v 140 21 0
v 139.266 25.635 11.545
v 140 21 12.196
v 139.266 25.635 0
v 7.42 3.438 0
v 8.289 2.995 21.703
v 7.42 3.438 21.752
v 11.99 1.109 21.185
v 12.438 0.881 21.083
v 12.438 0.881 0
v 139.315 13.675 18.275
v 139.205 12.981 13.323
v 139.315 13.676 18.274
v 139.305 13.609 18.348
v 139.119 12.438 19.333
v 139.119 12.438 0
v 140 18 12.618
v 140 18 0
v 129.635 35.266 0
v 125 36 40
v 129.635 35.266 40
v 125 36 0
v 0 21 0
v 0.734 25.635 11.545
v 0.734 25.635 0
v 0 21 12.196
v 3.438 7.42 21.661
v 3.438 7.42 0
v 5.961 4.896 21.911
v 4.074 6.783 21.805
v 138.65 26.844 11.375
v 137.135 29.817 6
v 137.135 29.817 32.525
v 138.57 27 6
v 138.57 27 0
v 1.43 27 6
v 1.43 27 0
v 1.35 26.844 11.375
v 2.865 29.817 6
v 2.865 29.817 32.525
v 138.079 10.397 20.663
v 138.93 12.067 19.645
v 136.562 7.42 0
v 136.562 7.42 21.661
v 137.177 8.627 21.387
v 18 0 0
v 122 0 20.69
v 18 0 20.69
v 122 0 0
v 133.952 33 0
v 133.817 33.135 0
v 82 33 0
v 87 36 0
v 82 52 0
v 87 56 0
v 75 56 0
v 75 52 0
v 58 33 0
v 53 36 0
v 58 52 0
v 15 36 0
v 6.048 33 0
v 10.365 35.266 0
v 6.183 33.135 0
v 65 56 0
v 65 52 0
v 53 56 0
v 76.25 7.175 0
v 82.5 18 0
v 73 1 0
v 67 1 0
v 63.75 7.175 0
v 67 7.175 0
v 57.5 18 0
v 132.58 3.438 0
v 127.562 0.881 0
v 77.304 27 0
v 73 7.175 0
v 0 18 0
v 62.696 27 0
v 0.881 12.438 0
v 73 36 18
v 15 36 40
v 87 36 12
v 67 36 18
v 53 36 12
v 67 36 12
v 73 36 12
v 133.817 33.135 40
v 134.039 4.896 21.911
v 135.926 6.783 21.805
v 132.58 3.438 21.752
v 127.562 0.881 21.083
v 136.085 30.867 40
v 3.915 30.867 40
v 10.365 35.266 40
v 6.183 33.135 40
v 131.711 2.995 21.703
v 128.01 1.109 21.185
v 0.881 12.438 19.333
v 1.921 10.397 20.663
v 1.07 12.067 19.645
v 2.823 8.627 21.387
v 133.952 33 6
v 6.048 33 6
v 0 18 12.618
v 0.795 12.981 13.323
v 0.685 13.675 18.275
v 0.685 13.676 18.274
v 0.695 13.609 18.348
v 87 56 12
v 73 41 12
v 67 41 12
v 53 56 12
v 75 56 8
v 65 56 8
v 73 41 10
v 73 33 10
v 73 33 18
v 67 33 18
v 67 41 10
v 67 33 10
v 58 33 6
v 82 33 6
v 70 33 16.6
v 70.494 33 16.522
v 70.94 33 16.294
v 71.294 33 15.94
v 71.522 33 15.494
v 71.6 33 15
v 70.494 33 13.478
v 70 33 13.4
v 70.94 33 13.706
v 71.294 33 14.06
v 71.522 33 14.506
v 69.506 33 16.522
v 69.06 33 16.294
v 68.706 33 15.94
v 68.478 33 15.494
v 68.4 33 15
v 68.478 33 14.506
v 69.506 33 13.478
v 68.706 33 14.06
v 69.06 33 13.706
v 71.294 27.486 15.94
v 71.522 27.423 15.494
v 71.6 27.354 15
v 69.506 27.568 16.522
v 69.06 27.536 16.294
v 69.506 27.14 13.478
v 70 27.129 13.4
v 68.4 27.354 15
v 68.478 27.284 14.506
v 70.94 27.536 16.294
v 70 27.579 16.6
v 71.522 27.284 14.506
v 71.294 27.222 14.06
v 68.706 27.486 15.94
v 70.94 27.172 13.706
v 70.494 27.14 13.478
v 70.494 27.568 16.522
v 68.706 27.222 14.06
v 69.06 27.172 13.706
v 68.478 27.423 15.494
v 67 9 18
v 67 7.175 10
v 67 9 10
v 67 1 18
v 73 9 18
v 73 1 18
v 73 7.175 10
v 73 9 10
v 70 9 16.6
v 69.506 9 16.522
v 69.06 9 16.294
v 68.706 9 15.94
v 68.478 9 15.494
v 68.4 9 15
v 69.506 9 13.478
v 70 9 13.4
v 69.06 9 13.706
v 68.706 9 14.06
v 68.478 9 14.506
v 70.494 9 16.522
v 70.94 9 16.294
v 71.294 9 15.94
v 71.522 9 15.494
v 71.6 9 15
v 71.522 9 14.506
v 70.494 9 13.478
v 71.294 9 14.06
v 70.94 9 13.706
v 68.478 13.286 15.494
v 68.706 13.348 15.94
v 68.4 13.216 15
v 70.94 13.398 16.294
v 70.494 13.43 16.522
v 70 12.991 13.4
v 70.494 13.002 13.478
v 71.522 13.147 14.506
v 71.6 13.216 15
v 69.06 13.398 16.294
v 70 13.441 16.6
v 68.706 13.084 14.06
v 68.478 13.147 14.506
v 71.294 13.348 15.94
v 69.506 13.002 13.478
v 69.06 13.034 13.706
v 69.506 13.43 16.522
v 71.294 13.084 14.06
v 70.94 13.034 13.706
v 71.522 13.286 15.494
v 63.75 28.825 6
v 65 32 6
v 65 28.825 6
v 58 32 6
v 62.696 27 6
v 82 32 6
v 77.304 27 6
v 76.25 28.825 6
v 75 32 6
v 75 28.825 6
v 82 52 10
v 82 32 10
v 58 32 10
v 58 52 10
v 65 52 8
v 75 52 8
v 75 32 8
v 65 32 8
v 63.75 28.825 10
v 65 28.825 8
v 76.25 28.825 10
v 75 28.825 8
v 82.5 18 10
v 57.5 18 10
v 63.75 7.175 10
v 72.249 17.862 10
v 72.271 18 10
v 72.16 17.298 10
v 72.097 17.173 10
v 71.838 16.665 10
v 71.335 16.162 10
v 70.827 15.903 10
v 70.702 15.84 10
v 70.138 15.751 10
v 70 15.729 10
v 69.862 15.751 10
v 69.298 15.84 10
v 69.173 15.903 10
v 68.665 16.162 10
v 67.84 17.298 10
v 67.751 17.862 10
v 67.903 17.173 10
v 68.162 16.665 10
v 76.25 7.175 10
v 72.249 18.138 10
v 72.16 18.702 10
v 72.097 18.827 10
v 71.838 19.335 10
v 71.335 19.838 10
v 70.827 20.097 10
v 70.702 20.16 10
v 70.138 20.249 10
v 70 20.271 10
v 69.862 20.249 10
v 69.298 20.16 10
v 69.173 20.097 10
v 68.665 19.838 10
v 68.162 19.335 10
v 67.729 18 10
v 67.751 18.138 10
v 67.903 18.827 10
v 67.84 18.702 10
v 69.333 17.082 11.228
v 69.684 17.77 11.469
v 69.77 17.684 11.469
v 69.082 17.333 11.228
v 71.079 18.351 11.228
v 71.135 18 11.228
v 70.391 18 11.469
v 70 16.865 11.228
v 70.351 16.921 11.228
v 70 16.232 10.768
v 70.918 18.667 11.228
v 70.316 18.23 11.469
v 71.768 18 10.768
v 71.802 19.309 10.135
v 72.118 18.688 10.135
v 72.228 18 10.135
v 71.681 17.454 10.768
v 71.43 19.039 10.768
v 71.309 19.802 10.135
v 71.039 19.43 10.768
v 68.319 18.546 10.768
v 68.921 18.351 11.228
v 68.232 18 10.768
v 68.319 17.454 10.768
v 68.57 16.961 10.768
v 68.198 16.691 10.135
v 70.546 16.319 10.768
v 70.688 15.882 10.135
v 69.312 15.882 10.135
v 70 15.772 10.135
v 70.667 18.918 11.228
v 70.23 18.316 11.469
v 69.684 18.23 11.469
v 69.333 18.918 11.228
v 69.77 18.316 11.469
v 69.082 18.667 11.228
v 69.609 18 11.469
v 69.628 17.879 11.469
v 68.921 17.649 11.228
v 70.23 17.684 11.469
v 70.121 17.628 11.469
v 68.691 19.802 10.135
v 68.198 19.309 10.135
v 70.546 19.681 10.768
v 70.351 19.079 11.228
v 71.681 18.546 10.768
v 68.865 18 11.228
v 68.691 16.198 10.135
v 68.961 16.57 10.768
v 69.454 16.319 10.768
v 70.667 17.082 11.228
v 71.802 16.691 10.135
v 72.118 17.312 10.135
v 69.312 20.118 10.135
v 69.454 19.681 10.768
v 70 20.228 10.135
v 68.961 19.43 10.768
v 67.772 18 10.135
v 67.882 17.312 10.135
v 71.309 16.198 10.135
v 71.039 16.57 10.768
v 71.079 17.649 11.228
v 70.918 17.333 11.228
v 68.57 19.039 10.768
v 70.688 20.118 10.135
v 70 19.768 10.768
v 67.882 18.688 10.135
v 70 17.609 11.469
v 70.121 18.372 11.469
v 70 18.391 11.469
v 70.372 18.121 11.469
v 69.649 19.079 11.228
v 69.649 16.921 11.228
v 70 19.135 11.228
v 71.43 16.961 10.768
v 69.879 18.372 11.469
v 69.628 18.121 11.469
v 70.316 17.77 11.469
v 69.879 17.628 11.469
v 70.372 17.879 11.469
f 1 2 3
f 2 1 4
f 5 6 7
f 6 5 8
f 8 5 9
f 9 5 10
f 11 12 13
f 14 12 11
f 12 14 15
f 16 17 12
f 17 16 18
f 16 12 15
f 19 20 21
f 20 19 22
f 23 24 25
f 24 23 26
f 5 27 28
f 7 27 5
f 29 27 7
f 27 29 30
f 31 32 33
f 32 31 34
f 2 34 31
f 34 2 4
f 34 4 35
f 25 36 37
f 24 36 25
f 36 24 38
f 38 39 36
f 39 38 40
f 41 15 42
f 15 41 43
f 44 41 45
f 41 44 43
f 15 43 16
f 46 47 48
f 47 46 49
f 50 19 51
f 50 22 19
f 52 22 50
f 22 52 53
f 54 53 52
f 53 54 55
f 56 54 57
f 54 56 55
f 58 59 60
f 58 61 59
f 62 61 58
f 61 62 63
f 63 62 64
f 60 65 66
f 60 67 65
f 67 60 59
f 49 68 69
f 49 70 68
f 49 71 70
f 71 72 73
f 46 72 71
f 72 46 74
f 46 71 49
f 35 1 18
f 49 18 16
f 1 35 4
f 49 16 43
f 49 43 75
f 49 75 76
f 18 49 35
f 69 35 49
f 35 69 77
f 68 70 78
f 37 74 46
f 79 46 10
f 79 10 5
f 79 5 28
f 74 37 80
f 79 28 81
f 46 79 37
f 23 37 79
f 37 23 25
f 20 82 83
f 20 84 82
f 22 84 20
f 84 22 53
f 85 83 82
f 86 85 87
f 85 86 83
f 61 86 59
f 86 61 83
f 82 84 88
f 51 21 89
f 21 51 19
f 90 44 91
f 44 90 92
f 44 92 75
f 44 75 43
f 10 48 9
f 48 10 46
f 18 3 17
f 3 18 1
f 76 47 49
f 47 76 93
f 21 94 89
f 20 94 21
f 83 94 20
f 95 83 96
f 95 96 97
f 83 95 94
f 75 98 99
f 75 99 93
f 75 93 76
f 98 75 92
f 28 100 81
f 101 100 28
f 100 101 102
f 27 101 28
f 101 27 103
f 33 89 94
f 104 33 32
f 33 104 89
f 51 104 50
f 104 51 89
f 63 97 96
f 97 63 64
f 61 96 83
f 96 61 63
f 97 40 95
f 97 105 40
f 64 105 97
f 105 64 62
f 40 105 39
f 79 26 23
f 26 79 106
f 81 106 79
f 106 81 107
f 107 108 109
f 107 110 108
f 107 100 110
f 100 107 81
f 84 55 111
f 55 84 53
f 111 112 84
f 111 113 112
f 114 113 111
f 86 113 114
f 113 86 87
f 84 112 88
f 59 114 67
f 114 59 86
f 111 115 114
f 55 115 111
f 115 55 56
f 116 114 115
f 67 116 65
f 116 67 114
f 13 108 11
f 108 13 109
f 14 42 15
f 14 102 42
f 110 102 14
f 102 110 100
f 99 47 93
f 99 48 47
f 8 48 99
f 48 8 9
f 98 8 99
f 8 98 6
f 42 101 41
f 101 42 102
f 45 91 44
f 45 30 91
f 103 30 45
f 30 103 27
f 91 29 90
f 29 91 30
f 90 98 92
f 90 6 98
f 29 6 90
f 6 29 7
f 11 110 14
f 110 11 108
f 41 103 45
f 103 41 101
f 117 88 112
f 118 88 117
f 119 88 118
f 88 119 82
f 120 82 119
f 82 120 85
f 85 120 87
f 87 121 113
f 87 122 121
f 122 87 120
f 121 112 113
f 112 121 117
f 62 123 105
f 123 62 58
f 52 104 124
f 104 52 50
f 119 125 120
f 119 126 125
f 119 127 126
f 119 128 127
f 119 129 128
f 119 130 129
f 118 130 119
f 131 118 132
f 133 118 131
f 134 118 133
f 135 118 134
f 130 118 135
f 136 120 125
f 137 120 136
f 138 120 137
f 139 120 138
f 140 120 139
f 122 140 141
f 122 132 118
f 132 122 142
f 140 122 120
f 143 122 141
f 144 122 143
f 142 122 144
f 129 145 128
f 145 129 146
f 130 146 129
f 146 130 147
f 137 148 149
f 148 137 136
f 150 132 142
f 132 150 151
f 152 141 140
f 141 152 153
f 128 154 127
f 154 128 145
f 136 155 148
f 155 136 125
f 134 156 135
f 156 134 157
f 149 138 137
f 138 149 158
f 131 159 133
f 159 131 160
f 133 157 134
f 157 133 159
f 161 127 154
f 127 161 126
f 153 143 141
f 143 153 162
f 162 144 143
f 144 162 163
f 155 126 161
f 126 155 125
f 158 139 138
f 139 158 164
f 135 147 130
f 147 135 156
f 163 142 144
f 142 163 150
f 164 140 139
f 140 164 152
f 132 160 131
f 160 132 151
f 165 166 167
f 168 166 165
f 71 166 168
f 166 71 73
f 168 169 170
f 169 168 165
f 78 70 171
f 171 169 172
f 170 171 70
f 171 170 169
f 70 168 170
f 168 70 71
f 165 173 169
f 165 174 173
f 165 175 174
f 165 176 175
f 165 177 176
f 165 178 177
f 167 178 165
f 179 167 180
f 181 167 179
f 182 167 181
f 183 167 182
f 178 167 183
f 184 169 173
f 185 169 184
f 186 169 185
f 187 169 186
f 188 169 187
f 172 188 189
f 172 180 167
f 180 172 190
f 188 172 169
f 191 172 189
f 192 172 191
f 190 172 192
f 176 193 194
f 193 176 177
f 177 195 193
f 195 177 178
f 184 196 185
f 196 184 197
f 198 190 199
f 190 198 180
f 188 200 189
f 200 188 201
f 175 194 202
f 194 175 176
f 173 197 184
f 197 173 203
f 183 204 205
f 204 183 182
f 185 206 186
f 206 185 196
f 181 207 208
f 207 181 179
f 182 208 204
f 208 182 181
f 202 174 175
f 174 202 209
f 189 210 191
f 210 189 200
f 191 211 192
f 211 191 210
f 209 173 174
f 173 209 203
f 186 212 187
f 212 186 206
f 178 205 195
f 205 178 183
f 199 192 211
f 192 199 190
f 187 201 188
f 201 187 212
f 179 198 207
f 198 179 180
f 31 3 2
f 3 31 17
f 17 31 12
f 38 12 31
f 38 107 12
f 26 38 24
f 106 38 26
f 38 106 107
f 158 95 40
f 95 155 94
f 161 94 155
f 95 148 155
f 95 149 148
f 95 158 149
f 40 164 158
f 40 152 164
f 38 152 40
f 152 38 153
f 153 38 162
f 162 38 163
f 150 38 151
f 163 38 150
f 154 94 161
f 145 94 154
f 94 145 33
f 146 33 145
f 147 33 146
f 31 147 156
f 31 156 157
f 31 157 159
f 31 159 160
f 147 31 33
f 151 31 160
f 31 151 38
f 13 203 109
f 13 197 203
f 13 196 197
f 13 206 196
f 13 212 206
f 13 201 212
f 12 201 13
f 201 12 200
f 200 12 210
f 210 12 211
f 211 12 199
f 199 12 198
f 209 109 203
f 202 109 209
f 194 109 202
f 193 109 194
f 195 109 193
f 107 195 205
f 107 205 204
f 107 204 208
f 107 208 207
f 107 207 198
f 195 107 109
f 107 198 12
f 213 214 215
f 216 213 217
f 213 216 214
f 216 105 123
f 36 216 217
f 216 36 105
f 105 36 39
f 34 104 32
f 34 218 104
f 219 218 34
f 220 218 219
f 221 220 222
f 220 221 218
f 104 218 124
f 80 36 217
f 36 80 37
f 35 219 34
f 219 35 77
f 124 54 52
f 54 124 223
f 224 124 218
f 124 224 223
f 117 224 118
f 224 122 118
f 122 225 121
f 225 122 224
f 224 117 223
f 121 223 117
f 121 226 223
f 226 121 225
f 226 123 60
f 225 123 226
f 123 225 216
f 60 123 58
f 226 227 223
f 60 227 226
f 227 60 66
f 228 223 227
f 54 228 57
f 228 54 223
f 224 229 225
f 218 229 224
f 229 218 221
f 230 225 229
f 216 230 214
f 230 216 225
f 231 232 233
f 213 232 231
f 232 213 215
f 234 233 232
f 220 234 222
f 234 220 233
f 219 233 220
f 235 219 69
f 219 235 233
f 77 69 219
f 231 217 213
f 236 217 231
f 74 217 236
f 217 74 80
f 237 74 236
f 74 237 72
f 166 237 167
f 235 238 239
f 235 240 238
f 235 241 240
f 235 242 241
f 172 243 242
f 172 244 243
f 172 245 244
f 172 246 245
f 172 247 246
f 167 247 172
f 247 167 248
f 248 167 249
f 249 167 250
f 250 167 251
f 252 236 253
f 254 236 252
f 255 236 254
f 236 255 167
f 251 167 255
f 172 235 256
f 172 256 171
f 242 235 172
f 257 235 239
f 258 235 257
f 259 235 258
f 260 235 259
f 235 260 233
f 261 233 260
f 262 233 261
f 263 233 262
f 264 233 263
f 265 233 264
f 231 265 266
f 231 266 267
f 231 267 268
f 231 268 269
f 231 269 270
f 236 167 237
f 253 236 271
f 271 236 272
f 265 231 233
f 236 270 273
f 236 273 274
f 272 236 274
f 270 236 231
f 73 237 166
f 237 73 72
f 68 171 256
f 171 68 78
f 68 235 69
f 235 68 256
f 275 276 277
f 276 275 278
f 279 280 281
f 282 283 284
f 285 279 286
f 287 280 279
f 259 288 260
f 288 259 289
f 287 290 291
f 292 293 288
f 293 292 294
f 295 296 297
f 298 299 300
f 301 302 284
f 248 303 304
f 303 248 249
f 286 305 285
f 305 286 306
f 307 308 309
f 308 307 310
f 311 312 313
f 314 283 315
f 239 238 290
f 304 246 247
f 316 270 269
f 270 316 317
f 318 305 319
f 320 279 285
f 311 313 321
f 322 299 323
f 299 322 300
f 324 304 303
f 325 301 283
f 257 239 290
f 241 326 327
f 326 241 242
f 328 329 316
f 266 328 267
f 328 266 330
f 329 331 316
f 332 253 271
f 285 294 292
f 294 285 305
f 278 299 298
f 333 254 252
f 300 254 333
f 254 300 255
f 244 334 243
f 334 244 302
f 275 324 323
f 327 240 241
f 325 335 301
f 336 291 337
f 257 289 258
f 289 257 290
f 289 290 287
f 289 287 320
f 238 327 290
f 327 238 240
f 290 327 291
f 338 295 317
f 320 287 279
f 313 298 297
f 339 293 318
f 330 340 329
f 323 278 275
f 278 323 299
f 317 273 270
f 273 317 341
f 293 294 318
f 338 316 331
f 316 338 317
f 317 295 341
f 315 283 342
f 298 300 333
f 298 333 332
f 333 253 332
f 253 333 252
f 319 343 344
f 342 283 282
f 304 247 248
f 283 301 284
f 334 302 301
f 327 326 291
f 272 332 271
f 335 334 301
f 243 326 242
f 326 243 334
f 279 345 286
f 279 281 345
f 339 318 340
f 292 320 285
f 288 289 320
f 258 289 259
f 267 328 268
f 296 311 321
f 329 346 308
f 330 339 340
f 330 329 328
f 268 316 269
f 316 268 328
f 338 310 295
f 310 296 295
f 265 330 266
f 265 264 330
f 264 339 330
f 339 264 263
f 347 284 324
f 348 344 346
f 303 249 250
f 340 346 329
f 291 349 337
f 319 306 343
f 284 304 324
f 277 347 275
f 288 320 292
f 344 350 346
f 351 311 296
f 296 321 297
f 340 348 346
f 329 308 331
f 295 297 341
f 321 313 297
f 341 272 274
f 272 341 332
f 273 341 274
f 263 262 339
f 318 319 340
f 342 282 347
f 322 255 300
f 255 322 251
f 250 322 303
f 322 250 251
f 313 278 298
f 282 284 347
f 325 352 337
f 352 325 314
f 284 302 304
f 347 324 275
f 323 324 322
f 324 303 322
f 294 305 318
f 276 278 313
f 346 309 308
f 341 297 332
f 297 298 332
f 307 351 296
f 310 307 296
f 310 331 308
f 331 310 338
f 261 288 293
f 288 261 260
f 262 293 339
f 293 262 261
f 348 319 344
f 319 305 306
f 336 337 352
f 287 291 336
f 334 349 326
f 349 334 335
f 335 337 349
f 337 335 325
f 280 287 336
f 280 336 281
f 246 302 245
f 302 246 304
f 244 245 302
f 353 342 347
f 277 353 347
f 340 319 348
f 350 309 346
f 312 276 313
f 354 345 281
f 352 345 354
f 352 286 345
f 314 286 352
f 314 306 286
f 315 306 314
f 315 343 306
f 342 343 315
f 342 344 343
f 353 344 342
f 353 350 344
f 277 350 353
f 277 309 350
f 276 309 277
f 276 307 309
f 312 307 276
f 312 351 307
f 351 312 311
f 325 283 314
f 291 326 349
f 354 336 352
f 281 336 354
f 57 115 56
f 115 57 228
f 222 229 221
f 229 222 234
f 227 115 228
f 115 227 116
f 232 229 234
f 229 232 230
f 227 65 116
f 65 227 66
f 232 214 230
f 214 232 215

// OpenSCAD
$fn = 20;

// Mudar os parametros abaixo
larguraDock = 140;
espessuraDevice = 14;

// Não alterar a partir daqui
anguloDevice = 8;
compensacaoAngular = 0;
profundidadeBase = espessuraDevice + 22;
alturaBaseFrente = 20;
alturaBaseEncosto = 40;
alturaRecorteDevice = 15;
diametroLeds = 3.2;
tamanhoLeds = 8;


base();
//led();

//recorteSensores();

module base(){
    //Base
    difference(){
        union(){
       roundedcube(larguraDock, profundidadeBase, alturaBaseEncosto, 18,18,15,15);
        translate([larguraDock / 2 - 17, profundidadeBase, 0]) cube([34, 20, 12]);
            
        }
        // Recorte do device
         difference(){
           union(){
  rotate([-anguloDevice,0,0]) translate([-1,-1 ,alturaBaseFrente])cube([larguraDock + 2,profundidadeBase / 2,alturaBaseEncosto]);
            translate([-1,-1 ,alturaBaseFrente])cube([larguraDock + 2,profundidadeBase / 2,alturaBaseEncosto]);
        
      }
        translate([-2,profundidadeBase /4 - 5 ,2]) rotate([0,90,0]) rotate([0,0,-anguloDevice])  resize([40,30,0]) cylinder(d = profundidadeBase /2, h = larguraDock + 4, $fn = 50);
}
  
        
        
        //Recortes da parte frontal
         
        rotate([-anguloDevice,0,0]) translate([-1,(profundidadeBase -espessuraDevice) / 2 - compensacaoAngular ,alturaRecorteDevice]) cube([larguraDock + 2, espessuraDevice, alturaBaseEncosto]);
        
        // Recorte carregador
       translate([0,profundidadeBase / 2 + 9, 0]) cube([larguraDock,6,6]); 
 
        
        //Recorte dos sensores
        translate([(larguraDock - 6) / 2,profundidadeBase - 12, 0 ]) recorteSensores();
        
        translate([(larguraDock + 6) / 2,18, 0 ]) rotate([0,0,180]) recorteSensores();
        
    // recorte eletronica
    translate([((larguraDock) / 2) - 12,(profundidadeBase) - 4, 0]) cube([24, 20, 10]);
        
    // recorte Led
    translate([(larguraDock) / 2,(profundidadeBase) / 2]) cylinder($fn=6, d=25, h =10);
    
  translate([(larguraDock) / 2,(profundidadeBase) / 2, 9]) sphere(d=5);
    
    
        
        
        
        translate([(larguraDock - 10) / 2,10, 0]) cube([10,profundidadeBase + 20,8]);
    }
    
    
    
}


module recorteSensores(){
    
    largura = 6;
    altura = 18;
    alturaLed = 15;
    anguloLeds = 0;
    
    // diametro led = 5
    // tamanho led = 12
    
    translate([0,9,0]) cube([largura,8,altura]);
    
    translate([largura / 2,12,alturaLed]) rotate([90,0,anguloLeds]) cylinder(h=tamanhoLeds + 1, d=diametroLeds);
}

module led(){
    cylinder($fn=6, d=23, h =1.3);
    translate([0,0,1.3]) cylinder($fn=20, d=8, h =3);
    translate([0,0,4.3]) sphere(d = 5);
}

module roundedcube(xdim ,ydim ,zdim,rdim1, rdim2, rdim3, rdim4){
    hull(){
        translate([rdim1,rdim1,0]) cylinder(r=rdim1, h=zdim);
        translate([xdim-rdim2,rdim2,0]) cylinder(r=rdim2, h=zdim);

        translate([rdim3,ydim-rdim3,0]) cylinder(r=rdim3, h=zdim);
        translate([xdim-rdim4,ydim-rdim4,0]) cylinder(r=rdim4, h=zdim);
    }
}
